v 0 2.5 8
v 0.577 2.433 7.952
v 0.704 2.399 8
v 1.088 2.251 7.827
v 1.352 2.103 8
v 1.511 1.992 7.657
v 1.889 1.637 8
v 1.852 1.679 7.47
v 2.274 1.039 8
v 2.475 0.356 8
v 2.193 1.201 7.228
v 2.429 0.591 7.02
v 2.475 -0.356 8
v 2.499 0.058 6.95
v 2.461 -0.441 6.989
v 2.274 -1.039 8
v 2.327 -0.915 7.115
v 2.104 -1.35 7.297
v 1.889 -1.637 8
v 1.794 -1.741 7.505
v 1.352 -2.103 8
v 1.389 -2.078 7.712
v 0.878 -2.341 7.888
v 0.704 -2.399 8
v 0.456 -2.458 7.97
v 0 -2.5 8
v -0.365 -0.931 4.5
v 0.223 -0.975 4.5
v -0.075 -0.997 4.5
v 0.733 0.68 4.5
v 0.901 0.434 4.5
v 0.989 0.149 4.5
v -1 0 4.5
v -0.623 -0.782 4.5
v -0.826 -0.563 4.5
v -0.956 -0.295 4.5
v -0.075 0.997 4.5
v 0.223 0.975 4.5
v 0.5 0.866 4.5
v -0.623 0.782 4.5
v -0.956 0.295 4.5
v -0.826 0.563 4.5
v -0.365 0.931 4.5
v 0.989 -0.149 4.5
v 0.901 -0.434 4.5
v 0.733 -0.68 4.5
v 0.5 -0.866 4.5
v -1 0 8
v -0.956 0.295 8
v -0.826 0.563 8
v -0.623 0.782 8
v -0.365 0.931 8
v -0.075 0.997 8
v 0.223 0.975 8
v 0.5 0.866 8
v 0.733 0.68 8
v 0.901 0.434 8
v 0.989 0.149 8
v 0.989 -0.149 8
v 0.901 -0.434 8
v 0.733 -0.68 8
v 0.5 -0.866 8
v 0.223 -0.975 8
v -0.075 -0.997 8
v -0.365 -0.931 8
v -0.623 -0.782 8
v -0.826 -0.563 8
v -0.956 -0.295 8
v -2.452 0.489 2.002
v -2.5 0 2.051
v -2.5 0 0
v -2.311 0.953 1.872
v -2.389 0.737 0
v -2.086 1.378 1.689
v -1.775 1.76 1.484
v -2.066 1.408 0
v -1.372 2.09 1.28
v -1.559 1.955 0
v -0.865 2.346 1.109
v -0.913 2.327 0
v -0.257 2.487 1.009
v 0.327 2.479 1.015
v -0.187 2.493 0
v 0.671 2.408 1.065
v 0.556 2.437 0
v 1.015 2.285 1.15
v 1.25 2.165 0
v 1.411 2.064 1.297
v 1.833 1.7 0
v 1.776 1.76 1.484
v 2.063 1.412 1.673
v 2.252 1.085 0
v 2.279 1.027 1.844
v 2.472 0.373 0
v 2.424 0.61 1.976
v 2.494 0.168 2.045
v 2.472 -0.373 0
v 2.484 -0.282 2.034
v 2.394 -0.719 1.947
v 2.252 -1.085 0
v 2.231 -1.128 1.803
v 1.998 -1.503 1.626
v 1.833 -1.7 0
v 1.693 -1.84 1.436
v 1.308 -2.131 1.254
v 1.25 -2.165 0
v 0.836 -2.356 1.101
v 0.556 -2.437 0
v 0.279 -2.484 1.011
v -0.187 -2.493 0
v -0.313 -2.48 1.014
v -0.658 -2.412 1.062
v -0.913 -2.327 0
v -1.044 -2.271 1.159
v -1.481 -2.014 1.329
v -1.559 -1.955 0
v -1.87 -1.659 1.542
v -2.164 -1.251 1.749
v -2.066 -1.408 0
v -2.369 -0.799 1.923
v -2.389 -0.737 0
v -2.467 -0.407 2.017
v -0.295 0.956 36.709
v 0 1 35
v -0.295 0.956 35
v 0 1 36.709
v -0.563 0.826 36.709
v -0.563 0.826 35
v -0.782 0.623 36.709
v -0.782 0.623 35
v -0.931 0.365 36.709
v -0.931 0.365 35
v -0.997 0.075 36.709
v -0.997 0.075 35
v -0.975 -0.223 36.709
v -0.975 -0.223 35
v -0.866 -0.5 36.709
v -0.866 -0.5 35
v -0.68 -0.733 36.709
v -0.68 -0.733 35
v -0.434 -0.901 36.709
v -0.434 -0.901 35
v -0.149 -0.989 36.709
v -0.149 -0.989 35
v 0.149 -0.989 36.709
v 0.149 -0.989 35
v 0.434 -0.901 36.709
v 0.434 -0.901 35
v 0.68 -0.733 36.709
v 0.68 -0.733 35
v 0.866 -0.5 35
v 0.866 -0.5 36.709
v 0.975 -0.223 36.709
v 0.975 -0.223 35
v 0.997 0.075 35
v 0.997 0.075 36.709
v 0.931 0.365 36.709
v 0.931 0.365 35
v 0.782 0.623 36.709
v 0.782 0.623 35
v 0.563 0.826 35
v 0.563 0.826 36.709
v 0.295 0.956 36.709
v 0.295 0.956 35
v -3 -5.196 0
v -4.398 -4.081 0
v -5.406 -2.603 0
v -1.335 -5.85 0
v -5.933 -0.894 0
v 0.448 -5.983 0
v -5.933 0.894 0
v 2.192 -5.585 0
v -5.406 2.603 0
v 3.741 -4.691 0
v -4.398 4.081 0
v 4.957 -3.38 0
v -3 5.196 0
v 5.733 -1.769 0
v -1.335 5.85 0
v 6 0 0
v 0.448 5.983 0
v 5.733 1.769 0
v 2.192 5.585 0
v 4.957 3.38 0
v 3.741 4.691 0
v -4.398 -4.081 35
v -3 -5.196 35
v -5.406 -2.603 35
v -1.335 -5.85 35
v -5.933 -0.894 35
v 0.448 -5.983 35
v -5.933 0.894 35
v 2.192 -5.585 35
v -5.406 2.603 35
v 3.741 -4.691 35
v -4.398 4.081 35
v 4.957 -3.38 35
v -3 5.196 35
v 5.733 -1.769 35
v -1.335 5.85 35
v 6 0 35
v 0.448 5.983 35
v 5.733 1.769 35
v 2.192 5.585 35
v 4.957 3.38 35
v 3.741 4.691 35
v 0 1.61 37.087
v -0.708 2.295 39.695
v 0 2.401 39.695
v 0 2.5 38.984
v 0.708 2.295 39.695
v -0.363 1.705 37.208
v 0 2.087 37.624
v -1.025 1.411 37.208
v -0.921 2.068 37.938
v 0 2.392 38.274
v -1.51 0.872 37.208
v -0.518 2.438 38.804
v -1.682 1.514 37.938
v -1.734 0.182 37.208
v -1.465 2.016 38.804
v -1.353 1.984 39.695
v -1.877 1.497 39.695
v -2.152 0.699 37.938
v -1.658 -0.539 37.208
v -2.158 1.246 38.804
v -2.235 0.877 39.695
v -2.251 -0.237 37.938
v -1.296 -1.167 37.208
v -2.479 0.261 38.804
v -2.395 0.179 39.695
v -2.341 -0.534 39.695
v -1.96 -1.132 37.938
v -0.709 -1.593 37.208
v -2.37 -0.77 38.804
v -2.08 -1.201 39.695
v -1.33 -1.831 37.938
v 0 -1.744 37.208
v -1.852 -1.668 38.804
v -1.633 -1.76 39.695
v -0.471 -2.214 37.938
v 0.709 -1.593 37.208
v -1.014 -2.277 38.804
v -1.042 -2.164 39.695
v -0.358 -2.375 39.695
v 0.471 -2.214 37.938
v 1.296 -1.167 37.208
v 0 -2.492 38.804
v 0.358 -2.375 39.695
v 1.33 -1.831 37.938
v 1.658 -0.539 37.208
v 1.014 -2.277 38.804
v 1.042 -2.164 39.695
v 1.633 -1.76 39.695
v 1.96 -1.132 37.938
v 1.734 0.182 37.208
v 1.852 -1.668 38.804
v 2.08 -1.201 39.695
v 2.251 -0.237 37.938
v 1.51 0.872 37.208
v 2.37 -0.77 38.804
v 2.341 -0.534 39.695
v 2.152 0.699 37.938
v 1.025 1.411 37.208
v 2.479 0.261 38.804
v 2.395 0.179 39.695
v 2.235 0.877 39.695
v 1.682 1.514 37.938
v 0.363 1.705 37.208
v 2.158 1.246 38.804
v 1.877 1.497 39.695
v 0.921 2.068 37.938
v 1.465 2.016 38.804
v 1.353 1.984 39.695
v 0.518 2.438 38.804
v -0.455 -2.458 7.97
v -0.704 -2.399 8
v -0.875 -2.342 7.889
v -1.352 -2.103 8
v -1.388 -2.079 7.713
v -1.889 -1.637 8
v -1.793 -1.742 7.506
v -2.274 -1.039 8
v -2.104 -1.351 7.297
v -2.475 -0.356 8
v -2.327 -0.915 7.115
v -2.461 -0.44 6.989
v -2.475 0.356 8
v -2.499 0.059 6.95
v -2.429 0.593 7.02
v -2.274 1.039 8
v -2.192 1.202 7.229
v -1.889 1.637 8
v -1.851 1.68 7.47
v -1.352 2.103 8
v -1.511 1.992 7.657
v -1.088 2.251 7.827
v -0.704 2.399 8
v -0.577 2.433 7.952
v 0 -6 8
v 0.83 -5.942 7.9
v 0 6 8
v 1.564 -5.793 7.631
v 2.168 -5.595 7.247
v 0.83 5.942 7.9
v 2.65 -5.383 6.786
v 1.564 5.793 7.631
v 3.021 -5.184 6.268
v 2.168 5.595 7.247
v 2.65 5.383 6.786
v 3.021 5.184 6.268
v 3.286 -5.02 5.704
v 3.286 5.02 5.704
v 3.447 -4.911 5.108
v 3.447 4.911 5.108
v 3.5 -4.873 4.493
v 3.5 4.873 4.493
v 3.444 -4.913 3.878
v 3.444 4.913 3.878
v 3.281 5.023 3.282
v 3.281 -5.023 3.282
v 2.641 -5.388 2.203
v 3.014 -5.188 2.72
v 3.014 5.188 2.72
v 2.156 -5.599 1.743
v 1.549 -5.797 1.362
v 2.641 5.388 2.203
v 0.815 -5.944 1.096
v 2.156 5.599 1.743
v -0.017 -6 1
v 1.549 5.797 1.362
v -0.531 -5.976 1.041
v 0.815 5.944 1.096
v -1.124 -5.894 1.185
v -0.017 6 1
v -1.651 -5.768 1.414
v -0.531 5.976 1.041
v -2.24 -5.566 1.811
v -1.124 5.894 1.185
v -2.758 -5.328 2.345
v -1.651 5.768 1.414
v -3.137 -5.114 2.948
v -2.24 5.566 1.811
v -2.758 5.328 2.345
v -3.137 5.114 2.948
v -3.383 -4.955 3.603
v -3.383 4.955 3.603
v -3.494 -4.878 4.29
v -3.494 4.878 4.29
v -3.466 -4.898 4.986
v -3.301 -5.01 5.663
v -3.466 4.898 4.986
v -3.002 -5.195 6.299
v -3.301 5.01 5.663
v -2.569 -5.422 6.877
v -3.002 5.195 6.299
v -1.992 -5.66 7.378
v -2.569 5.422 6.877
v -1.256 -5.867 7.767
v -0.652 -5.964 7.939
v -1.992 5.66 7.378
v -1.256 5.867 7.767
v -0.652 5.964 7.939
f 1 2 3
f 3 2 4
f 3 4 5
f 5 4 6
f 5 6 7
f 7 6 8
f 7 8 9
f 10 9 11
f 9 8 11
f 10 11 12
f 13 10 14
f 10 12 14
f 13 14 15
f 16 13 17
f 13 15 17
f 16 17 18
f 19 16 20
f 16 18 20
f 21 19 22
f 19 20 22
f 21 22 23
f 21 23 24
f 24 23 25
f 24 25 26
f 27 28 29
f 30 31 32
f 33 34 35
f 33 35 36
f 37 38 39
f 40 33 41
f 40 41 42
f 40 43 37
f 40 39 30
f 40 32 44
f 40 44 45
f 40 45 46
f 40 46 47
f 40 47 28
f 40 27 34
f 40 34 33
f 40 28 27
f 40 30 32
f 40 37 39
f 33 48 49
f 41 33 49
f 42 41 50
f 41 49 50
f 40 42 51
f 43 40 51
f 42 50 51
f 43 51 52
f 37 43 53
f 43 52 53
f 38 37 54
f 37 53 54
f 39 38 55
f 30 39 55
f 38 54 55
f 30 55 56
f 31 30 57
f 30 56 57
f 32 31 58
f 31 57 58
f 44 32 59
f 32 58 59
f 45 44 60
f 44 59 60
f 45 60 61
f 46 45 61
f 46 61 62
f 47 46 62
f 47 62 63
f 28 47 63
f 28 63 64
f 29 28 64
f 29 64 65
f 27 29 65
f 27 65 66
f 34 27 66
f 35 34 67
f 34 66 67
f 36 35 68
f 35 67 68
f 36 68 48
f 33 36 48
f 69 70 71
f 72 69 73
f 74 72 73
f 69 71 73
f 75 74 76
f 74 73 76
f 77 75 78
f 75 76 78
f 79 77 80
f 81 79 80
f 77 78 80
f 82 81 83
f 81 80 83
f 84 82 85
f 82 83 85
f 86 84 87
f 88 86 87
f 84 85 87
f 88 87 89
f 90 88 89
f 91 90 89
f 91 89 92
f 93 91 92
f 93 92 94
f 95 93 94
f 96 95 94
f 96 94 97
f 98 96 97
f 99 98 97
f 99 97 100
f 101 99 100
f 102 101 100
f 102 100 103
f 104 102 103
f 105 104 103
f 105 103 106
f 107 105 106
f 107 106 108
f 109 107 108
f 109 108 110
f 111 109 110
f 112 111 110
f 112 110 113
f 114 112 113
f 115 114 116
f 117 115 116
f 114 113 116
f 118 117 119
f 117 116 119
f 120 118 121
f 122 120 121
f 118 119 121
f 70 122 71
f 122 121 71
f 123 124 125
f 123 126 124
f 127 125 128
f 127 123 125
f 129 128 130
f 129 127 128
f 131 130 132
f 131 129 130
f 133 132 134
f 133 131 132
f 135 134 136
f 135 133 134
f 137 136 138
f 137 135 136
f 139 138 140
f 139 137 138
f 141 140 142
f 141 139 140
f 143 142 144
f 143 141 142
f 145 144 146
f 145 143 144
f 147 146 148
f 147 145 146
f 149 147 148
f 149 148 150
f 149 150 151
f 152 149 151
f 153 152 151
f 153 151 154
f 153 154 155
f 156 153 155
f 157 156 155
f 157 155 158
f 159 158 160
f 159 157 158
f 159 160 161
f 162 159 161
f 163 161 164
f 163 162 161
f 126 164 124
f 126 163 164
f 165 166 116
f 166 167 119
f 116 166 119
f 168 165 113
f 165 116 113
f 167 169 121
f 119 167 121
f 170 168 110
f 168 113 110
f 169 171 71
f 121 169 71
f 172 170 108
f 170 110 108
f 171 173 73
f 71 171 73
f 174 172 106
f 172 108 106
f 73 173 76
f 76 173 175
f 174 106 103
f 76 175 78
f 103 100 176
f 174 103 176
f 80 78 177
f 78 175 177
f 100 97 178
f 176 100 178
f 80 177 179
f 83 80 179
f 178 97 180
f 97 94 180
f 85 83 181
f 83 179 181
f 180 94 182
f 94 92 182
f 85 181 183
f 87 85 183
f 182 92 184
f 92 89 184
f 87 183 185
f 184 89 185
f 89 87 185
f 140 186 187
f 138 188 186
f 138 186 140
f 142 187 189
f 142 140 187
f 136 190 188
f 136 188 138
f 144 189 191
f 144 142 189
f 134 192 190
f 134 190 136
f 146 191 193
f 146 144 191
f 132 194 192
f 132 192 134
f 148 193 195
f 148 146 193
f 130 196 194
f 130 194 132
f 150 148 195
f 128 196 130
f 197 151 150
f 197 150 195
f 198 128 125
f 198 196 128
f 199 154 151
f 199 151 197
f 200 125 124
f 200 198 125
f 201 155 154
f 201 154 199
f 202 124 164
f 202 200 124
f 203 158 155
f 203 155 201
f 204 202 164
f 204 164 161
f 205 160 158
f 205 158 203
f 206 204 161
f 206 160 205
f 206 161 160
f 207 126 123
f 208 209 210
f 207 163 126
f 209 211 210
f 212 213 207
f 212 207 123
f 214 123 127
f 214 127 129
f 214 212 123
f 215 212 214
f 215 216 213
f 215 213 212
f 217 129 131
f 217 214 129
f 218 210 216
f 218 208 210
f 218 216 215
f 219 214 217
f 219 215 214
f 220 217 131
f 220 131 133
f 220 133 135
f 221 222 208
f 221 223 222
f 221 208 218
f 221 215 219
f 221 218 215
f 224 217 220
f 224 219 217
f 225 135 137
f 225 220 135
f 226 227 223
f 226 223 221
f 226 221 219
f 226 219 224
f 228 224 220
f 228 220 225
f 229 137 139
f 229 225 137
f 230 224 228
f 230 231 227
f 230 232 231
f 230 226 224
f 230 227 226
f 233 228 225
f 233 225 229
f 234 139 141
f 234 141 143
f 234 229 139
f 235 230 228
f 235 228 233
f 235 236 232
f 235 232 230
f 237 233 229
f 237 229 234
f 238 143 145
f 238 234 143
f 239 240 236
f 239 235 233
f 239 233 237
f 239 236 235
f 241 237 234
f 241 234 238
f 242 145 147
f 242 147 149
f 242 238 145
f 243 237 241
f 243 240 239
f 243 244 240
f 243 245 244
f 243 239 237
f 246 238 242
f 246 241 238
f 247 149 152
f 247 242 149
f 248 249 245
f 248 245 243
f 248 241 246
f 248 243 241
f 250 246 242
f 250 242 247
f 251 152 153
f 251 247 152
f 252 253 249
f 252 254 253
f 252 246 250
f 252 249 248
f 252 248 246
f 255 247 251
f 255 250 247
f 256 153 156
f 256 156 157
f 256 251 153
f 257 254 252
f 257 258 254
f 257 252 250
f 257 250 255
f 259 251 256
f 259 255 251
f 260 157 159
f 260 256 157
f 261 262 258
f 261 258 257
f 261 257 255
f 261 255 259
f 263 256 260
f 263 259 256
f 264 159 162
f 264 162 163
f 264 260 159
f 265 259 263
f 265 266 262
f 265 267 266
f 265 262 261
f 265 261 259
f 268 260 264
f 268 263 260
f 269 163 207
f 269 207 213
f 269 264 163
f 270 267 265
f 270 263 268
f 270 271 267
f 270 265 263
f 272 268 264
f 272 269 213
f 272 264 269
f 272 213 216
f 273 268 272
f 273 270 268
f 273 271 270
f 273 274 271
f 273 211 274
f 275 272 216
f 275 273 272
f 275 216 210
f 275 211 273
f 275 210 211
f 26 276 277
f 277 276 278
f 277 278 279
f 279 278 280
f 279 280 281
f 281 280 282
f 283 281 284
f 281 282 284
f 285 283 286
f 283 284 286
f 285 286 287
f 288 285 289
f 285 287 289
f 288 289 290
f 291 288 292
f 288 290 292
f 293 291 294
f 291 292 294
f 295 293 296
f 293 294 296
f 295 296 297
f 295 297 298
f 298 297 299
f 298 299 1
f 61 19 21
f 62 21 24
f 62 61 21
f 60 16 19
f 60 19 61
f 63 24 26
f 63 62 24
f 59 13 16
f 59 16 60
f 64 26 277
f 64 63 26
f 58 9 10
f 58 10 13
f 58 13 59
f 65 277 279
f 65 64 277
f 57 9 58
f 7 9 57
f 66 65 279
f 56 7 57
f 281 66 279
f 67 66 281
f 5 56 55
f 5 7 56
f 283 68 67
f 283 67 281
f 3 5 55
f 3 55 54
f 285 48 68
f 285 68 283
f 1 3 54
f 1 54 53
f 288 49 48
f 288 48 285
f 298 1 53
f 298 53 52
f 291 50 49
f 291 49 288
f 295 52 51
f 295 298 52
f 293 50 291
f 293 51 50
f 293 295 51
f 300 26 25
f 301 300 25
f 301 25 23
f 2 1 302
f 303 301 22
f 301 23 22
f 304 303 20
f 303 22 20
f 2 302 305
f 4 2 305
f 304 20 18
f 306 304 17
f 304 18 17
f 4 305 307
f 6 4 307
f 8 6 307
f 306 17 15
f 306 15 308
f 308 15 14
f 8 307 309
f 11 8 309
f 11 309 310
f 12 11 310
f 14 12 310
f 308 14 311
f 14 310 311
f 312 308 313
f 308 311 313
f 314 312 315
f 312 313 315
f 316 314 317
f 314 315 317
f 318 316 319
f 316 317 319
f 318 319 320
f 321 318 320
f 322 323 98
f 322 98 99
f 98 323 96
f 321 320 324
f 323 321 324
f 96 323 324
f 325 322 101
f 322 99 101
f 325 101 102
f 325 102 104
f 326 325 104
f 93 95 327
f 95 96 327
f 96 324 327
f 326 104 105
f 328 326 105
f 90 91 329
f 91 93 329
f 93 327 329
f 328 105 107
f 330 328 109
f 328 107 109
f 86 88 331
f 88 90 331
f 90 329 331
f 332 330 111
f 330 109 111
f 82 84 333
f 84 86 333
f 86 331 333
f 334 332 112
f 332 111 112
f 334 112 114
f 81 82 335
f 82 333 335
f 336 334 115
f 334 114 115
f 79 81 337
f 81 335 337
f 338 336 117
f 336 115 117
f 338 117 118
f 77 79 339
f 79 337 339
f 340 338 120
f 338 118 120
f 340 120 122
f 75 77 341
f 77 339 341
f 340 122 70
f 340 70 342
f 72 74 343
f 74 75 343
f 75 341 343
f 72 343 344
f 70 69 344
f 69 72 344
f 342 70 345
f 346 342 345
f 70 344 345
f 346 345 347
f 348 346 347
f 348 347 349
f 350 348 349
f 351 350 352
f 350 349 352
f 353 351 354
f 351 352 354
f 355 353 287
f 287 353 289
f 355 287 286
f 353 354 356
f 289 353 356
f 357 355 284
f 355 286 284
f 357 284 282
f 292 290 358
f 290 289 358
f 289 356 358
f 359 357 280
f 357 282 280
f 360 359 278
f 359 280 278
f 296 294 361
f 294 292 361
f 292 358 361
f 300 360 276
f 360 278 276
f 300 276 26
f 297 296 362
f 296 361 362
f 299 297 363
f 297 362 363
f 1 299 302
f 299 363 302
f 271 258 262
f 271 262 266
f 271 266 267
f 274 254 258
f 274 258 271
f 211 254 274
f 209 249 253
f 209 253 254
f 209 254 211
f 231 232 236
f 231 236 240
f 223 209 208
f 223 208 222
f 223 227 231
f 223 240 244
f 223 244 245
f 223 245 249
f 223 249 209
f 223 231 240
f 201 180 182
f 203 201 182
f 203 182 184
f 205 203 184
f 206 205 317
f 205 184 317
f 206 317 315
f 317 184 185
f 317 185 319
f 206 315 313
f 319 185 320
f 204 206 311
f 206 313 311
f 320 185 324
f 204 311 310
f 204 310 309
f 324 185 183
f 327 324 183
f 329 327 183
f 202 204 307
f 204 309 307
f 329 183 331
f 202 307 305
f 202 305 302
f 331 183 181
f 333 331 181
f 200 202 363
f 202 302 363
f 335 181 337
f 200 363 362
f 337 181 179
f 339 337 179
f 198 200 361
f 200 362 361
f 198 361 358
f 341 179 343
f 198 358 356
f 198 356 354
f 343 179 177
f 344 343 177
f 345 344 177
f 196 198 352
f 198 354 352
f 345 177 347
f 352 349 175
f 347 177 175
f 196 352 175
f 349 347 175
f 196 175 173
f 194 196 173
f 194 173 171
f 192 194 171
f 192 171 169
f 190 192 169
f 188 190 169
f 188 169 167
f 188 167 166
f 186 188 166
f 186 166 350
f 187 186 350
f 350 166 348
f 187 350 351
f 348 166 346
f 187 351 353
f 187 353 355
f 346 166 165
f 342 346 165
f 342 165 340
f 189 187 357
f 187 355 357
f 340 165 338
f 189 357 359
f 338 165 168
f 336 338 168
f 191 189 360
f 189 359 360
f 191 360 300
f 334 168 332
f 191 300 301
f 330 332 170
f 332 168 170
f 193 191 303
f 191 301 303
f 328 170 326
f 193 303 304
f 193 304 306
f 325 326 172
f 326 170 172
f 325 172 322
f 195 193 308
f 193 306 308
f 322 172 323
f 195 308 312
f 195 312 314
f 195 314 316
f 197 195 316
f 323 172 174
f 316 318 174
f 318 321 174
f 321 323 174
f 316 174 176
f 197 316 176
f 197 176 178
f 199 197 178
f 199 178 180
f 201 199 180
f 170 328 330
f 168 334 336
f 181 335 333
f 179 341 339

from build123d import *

# Parameters (mm, degrees)
ESQUISSE1_R             = 6
BASE_EXTRUSION_DEPTH    = 35
ESQUISSE2_R             = 3.5
ENL_V_MAT_EXTRU_1_DEPTH = 17.5
ESQUISSE3_R             = 2.5
ENL_V_MAT_EXTRU_2_DEPTH = 8
ESQUISSE4_R             = 1
BOSS_EXTRU_1_DEPTH      = 3.5


with BuildPart() as part:
    # Esquisse1 → Base-Extrusion (new body)
    with BuildSketch(Plane.XY):
        Circle(ESQUISSE1_R)
    extrude(amount=BASE_EXTRUSION_DEPTH)

    # Esquisse2 → Enlèv. mat.-Extru.1 (cut, symmetric)
    with BuildSketch(Plane(origin=(0, 0, 0), x_dir=(1, 0, 0), z_dir=(0, 1, 0))):
        with Locations(Location((0, -4.5, 0), (0, 0, 270))):
            Circle(ESQUISSE2_R)
    extrude(amount=ENL_V_MAT_EXTRU_1_DEPTH, both=True, mode=Mode.SUBTRACT)

    # Esquisse3 → Enlèv. mat.-Extru.2 (cut)
    with BuildSketch(Plane(origin=(0, 0, 0), x_dir=(-1, 0, 0), z_dir=(0, 0, -1))):
        Circle(ESQUISSE3_R)
    extrude(amount=-ENL_V_MAT_EXTRU_2_DEPTH, mode=Mode.SUBTRACT)

    # Esquisse4 → Boss.-Extru.1 (add)
    with BuildSketch(Plane(origin=(0, 0, 8), x_dir=(-1, 0, 0), z_dir=(0, 0, -1))):
        Circle(ESQUISSE4_R)
    extrude(amount=BOSS_EXTRU_1_DEPTH)

    # Esquisse5 → Boss.-Révol.1 (revolve)
    with BuildSketch(Plane(origin=(0, 0, 0), x_dir=(0, 0, -1), z_dir=(1, 0, 0))):
        with BuildLine():
            Line((-35, 1), (-36.708712153, 1))
            ThreePointArc((-36.708712153, 1), (-37.938114865, 2.263271959), (-39.69545069, 2.401322206))
            Line((-39.69545069, 2.401322206), (-39.69545069, 0))
            Line((-39.69545069, 0), (-35, 0))
            Line((-35, 0), (-35, 1))
        make_face()
    revolve(axis=Axis((0, 0, 31.912682492), (0, 0, 1)))


solid = part.part
